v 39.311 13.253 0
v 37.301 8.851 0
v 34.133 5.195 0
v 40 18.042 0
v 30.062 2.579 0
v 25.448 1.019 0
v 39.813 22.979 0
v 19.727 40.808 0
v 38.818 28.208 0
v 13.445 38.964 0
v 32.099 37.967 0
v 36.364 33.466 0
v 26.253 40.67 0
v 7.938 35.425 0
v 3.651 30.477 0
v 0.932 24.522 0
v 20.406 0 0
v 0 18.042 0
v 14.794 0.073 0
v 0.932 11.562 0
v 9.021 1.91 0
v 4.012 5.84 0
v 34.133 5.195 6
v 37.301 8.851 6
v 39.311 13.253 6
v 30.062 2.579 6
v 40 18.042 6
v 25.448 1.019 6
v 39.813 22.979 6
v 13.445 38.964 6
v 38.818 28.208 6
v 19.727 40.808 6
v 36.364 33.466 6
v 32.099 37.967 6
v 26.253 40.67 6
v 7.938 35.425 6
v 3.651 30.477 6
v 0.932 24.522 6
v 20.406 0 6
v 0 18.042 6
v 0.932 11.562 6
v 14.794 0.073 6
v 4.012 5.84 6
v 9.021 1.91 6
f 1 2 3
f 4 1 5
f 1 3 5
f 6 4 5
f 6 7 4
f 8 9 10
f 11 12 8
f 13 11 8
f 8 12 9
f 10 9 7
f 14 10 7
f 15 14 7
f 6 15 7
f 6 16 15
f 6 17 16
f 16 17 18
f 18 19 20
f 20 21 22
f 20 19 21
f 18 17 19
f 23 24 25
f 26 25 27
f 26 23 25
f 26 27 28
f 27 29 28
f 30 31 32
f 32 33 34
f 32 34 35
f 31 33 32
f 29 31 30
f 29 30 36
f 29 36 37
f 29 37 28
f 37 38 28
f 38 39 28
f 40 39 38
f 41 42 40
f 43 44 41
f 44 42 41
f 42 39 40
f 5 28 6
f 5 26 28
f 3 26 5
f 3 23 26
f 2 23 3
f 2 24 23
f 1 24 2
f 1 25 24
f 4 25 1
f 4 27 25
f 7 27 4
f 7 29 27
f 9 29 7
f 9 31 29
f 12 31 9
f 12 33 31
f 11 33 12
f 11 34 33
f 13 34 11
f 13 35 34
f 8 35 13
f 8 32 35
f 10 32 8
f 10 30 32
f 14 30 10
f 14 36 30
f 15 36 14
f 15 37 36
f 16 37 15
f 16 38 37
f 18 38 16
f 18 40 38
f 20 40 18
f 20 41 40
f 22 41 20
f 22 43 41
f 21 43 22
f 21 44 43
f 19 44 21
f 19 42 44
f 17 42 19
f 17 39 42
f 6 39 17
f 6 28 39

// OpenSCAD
$fn = 32;

// ----------------------------------------------------------------------
// Cam disc: base radius 17.0 mm, lift 6.0 mm, 22 profile points
// ----------------------------------------------------------------------

// --- parameters (mm) ---
profile_height = 6;       // extrusion height
profile_points = 22;      // points of the closed outline

profile = [[40, 18.042], [39.813, 22.979], [38.818, 28.208], [36.364, 33.466], [32.099, 37.967], [26.253, 40.67], [19.727, 40.808], [13.445, 38.964], [7.938, 35.425], [3.651, 30.477], [0.932, 24.522], [0, 18.042], [0.932, 11.562], [4.012, 5.84], [9.021, 1.91], [14.794, 0.073], [20.406, 0], [25.448, 1.019], [30.062, 2.579], [34.133, 5.195], [37.301, 8.851], [39.311, 13.253]];  // single closed polygon, 22 points, counter clockwise

// --- the one profile operation ---
linear_extrude(height = profile_height) polygon(points = profile);
